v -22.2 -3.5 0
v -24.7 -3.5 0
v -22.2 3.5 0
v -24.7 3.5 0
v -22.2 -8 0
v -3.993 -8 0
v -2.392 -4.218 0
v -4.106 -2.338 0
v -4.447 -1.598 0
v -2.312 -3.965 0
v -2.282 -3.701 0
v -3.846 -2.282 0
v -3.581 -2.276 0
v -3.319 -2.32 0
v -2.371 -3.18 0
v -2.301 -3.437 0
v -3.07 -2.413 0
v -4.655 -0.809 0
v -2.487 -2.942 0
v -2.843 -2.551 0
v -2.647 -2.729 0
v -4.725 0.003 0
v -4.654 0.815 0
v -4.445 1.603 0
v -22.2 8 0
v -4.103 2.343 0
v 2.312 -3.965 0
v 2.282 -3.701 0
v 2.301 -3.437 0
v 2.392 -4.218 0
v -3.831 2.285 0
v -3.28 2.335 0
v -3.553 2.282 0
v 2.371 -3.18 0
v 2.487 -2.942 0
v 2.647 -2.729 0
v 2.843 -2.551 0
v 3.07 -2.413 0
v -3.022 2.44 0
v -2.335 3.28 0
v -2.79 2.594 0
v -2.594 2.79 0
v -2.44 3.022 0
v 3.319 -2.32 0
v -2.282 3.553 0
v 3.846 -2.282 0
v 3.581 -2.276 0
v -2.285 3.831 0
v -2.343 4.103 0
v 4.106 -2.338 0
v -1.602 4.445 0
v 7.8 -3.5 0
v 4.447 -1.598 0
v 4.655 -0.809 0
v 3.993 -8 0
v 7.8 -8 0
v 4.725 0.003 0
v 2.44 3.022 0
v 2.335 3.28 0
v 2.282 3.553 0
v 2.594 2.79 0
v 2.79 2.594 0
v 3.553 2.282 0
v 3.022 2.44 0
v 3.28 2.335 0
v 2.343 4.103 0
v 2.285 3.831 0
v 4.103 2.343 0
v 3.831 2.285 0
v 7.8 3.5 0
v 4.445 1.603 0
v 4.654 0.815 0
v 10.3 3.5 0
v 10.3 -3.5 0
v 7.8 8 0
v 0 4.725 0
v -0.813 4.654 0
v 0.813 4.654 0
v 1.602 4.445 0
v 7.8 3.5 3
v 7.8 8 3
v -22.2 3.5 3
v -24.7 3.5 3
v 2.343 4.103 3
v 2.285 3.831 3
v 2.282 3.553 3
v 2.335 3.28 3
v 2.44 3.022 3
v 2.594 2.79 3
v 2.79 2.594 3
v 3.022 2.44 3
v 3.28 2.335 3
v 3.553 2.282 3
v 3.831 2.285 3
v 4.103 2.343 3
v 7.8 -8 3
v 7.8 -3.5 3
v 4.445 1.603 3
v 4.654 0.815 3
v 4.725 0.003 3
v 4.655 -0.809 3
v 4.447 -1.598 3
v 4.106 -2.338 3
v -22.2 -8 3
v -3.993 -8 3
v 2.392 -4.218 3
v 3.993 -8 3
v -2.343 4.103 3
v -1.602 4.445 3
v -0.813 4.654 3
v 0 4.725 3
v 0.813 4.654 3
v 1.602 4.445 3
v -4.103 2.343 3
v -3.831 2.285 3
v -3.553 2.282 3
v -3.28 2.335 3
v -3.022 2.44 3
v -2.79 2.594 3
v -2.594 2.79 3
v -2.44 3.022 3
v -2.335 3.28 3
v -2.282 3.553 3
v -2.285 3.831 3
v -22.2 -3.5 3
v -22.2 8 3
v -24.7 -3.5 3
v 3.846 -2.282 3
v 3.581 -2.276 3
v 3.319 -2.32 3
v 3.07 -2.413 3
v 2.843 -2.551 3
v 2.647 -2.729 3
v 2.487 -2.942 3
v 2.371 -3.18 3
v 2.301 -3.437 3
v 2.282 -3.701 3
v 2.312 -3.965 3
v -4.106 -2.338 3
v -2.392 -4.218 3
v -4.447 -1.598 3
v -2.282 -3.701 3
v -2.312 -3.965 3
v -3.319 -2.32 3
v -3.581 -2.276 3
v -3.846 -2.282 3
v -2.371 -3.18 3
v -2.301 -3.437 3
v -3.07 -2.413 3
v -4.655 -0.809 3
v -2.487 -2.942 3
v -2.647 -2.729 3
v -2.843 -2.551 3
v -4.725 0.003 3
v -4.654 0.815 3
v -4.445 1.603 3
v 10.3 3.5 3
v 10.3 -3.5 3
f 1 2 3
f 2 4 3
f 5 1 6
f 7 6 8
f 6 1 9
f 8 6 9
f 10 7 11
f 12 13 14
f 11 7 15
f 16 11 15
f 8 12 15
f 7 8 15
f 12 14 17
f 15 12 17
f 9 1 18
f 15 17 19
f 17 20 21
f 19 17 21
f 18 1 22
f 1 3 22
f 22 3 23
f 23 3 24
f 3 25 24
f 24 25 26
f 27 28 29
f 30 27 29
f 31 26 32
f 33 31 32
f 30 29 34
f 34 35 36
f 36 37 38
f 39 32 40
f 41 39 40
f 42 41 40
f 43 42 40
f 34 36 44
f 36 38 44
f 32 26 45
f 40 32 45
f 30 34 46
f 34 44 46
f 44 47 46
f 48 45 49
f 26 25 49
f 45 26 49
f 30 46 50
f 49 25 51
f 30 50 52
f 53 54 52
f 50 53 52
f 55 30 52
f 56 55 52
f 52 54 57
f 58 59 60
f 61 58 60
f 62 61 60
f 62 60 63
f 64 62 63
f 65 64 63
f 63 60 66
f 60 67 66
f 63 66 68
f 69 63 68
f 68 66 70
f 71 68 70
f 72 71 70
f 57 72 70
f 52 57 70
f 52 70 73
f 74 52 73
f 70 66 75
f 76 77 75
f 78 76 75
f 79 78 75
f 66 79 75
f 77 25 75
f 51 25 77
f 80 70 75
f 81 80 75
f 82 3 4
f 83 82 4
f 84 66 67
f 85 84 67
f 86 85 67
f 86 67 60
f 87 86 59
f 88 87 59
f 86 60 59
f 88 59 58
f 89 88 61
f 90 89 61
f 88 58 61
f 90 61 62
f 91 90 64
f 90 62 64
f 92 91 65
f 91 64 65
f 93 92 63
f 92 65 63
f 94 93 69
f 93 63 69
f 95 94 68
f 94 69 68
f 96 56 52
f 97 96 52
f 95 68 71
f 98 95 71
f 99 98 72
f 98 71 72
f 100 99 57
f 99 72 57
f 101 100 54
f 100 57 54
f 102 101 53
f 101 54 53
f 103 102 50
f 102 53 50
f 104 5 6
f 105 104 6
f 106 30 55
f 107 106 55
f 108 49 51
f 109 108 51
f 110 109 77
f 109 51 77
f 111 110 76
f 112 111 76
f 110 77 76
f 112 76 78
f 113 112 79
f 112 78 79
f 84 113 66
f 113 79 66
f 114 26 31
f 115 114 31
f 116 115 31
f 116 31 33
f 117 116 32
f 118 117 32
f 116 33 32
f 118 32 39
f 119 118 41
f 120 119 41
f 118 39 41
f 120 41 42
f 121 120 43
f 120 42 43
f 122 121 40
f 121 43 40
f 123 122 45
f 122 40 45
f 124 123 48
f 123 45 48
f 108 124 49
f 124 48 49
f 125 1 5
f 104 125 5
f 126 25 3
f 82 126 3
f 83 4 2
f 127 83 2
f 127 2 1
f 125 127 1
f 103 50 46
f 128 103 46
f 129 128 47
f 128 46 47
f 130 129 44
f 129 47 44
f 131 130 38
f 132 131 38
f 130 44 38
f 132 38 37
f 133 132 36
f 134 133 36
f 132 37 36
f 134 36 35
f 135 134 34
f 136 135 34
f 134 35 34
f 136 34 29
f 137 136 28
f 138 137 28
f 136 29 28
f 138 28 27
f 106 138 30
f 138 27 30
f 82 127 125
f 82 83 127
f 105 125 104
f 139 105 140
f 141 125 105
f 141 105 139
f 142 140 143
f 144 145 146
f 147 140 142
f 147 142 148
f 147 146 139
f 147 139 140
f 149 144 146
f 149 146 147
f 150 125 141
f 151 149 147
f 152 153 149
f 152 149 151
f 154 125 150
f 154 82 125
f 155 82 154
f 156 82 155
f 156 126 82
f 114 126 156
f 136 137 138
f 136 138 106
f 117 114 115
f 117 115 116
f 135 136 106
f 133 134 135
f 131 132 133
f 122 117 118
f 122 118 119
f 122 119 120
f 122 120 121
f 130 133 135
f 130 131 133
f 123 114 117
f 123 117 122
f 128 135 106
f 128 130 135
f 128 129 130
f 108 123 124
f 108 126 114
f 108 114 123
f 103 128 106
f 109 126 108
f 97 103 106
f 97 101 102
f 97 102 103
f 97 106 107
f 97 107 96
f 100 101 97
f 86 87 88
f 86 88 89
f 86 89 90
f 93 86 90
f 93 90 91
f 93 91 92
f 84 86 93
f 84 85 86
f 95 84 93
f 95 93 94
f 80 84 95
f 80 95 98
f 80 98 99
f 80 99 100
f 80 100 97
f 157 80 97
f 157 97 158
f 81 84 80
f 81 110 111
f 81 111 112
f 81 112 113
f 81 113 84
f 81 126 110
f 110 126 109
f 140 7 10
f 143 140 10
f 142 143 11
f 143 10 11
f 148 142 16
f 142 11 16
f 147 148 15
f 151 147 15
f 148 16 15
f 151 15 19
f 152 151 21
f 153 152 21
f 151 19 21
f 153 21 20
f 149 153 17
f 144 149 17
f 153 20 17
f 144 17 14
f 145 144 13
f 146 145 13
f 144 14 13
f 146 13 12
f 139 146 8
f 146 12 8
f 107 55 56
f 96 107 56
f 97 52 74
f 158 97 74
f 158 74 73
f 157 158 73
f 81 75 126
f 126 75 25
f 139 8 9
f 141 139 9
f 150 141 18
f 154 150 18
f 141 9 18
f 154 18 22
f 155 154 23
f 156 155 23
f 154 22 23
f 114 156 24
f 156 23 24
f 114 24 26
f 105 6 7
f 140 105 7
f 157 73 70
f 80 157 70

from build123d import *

# Parameters (mm, degrees)
BOSS_EXTRU_1_DEPTH = 3


with BuildPart() as part:
    # Esquisse1 → Boss.-Extru.1 (new body)
    with BuildSketch(Plane.XY):
        with BuildLine():
            Line((-24.7, -3.5), (-22.2, -3.5))
            Line((-22.2, -3.5), (-22.2, -8))
            Line((-22.2, -8), (-3.993420642, -8))
            Line((-3.993420642, -8), (-2.392209052, -4.218369106))
            ThreePointArc((-2.392209052, -4.218369106), (-2.646725452, -2.729399825), (-4.10580345, -2.338376153))
            ThreePointArc((-4.10580345, -2.338376153), (-4.724999134, 0.00286091), (-4.102968743, 2.343346431))
            ThreePointArc((-4.102968743, 2.343346431), (-2.687005769, 2.687005769), (-2.343346431, 4.102968743))
            ThreePointArc((-2.343346431, 4.102968743), (0, 4.725), (2.343346431, 4.102968743))
            ThreePointArc((2.343346431, 4.102968743), (2.687005769, 2.687005769), (4.102968743, 2.343346431))
            ThreePointArc((4.102968743, 2.343346431), (4.724999134, 0.00286091), (4.10580345, -2.338376153))
            ThreePointArc((4.10580345, -2.338376153), (2.646725452, -2.729399825), (2.392209052, -4.218369106))
            Line((2.392209052, -4.218369106), (3.993420642, -8))
            Line((3.993420642, -8), (7.8, -8))
            Line((7.8, -8), (7.8, -3.5))
            Line((7.8, -3.5), (10.3, -3.5))
            Line((10.3, -3.5), (10.3, 3.5))
            Line((10.3, 3.5), (7.8, 3.5))
            Line((7.8, 3.5), (7.8, 8))
            Line((7.8, 8), (-22.2, 8))
            Line((-22.2, 8), (-22.2, 3.5))
            Line((-22.2, 3.5), (-24.7, 3.5))
            Line((-24.7, 3.5), (-24.7, -3.5))
        make_face()
    extrude(amount=BOSS_EXTRU_1_DEPTH)


solid = part.part
